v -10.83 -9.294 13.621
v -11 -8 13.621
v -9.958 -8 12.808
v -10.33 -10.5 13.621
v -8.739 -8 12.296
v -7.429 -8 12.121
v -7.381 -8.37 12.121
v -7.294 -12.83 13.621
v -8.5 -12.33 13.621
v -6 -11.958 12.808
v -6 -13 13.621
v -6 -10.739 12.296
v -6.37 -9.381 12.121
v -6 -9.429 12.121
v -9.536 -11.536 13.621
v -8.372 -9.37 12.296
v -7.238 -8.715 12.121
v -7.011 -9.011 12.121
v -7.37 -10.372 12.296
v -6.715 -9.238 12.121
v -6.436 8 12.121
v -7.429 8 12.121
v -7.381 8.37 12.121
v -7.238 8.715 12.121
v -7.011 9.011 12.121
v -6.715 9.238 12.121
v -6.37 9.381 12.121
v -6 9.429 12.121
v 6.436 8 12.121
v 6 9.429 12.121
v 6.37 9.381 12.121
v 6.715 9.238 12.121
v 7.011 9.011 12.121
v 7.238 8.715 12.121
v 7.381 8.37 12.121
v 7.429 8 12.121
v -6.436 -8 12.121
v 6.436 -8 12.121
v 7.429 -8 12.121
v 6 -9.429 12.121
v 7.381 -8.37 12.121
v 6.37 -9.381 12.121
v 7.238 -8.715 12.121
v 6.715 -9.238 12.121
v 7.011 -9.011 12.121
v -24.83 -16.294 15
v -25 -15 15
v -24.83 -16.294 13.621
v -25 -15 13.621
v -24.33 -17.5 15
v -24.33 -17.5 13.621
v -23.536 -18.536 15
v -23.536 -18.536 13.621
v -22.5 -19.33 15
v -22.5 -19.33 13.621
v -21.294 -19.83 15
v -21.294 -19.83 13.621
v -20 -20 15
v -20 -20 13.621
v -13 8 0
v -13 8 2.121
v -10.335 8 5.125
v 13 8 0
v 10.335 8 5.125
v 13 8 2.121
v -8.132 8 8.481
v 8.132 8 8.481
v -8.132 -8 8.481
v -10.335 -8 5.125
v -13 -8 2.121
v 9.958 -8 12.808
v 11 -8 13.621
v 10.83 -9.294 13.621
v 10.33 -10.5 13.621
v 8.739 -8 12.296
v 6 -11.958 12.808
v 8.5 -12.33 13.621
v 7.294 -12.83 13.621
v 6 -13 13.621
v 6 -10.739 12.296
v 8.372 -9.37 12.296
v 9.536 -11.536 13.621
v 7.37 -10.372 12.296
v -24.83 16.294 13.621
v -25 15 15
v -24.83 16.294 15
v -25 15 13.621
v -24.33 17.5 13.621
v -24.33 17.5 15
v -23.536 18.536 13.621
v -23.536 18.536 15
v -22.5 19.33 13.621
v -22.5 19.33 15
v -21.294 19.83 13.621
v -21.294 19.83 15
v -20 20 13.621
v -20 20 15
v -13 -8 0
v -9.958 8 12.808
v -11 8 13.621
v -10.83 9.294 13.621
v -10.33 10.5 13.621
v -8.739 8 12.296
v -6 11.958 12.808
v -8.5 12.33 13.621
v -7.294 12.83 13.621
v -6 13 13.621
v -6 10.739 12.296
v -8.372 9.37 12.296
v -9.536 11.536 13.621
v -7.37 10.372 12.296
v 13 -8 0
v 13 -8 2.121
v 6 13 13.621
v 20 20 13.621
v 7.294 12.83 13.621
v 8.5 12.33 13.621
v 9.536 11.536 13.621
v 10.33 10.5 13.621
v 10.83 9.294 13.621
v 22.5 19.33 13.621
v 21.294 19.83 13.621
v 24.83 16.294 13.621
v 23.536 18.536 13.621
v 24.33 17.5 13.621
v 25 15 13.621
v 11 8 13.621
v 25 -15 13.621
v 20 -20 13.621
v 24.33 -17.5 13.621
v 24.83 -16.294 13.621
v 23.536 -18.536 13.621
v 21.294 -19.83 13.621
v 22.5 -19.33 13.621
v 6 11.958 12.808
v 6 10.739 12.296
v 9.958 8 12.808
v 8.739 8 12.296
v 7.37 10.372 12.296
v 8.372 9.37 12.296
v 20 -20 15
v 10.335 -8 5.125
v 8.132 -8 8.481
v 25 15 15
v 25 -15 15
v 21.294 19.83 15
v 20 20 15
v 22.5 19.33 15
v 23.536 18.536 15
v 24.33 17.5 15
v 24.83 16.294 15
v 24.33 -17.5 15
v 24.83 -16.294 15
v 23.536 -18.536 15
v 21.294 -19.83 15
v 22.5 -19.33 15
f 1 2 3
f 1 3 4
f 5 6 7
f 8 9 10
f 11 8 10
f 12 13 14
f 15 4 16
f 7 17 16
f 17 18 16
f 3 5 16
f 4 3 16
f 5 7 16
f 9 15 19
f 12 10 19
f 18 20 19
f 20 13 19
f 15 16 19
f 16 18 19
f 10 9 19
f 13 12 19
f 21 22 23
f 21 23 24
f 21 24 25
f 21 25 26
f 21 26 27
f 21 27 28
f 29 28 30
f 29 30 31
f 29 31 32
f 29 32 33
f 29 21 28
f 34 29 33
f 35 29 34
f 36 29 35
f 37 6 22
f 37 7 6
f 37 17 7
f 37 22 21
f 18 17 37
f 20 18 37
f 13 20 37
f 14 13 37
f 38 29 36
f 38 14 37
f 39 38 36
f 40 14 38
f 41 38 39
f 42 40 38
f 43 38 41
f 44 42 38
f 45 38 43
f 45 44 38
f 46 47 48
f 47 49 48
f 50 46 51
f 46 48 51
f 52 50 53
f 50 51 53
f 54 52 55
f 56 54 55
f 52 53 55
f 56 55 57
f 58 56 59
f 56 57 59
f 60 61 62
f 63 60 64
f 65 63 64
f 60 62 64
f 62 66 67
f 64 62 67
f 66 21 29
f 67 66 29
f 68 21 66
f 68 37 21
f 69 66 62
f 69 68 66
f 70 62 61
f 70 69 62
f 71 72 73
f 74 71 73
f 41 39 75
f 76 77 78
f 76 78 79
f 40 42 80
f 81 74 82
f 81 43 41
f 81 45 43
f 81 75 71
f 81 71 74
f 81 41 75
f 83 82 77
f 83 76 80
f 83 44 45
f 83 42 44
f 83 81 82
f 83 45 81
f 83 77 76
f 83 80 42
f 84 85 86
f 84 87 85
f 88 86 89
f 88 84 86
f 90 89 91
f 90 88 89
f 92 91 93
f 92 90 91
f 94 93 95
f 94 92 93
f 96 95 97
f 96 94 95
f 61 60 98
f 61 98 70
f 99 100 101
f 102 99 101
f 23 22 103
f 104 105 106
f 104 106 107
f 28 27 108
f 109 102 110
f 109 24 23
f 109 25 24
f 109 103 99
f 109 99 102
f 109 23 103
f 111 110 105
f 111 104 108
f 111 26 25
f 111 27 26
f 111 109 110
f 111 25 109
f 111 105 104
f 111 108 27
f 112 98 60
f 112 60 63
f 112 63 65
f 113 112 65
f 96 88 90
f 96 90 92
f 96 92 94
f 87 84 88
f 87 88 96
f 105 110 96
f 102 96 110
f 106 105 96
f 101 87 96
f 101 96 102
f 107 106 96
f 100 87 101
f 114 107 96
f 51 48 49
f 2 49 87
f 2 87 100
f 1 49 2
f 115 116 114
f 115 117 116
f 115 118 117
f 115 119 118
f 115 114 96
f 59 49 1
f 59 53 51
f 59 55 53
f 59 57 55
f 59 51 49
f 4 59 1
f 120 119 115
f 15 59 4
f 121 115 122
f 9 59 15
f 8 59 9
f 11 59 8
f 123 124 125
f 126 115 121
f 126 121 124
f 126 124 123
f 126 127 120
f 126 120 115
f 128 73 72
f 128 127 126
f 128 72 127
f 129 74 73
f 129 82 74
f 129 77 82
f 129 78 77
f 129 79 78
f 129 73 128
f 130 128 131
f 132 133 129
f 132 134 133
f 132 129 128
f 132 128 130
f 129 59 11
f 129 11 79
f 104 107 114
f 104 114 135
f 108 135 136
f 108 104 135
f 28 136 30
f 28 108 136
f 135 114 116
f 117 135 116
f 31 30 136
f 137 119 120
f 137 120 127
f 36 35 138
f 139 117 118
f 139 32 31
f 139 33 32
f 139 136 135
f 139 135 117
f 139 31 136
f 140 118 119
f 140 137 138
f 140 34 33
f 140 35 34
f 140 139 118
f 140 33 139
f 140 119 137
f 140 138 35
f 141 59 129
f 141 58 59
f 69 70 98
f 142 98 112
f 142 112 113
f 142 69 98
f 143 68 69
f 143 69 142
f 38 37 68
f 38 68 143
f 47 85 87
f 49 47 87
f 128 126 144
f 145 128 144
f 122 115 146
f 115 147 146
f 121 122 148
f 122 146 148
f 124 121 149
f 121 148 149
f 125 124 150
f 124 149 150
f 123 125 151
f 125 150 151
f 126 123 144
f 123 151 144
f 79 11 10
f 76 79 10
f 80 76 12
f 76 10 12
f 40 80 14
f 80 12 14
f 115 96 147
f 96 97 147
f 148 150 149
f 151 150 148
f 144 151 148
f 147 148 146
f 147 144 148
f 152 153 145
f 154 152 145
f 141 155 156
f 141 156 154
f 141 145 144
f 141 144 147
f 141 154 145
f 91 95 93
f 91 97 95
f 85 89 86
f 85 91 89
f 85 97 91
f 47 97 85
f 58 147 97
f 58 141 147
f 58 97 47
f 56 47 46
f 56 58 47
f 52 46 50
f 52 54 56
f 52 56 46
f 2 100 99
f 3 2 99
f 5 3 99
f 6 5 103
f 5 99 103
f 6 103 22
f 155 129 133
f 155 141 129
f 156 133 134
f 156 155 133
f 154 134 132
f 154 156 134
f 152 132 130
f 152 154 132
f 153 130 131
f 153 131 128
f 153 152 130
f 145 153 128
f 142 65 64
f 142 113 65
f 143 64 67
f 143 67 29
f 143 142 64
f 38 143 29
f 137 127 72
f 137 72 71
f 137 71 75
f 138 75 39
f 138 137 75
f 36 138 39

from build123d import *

# Parameters (mm, degrees)
F1_DEPTH     = 20
F2_DEPTH     = 13
F0_W         = 13
F0_H         = 2.1210866805
F3_R         = 5
F4_R         = 5
F6_DEPTH     = 8
F7_R         = 5
F8_T1_DEPTH  = 12
F8_T3_DEPTH  = 16
F8_T6_ANGLE  = 90
F8_T8_ANGLE  = 90
F8_T10_ANGLE = 90
F8_T12_ANGLE = 90


# Not quite as in the source:
# - a fillet or chamfer that OpenCascade refuses, or shapes differently, is made with other operations: its cross-section is extruded or revolved along the edge and cut away or added


with BuildPart() as f1:
    # F0 (on Front) → F1 (new body, symmetric)
    with BuildSketch(Plane.XZ):
        Polygon((0, 13.6210866805), (0, 15), (-25, 15), (-25, 13.6210866805), (-11, 13.6210866805), align=None)
        Polygon((25, 15), (0, 15), (0, 13.6210866805), (11, 13.6210866805), (25, 13.6210866805), align=None)
    extrude(amount=F1_DEPTH, both=True)

    # F0 (on Front) → F2 (join, symmetric)
    with BuildSketch(Plane.XZ):
        Polygon((0, 12.1210866805), (0, 13.6210866805), (-11, 13.6210866805), (-11, 12.1210866805), (-6.4361323602, 12.1210866805), align=None)
        Polygon((11, 13.6210866805), (0, 13.6210866805), (0, 12.1210866805), (6.4361323602, 12.1210866805), (11, 12.1210866805), align=None)
    extrude(amount=F2_DEPTH, both=True)

    # F4
    f4_edges = [f1.edges().sort_by_distance(p)[0] for p in [
        (-25, -20, 14.310543),
        (-25, 20, 14.310543),
        (25, -20, 14.310543),
        (25, 20, 14.310543),
    ]]
    fillet(f4_edges, radius=F4_R)

    # F0 (on Front) → F6 (join, symmetric)
    with BuildSketch(Plane.XZ):
        with BuildLine():
            Line((0, 2.1210866805), (0, 12.1210866805))
            Line((0, 12.1210866805), (-6.4361323602, 12.1210866805))
            ThreePointArc((-6.4361323602, 12.1210866805), (-9.1727786789, 6.7631671822), (-13, 2.1210866805))
            Line((-13, 2.1210866805), (0, 2.1210866805))
        make_face()
        with Locations((-6.5, 1.0605433403)):
            Rectangle(F0_W, F0_H)
        with BuildLine():
            Line((6.4361323602, 12.1210866805), (0, 12.1210866805))
            Line((0, 12.1210866805), (0, 2.1210866805))
            Line((0, 2.1210866805), (13, 2.1210866805))
            ThreePointArc((13, 2.1210866805), (9.1727786789, 6.7631671822), (6.4361323602, 12.1210866805))
        make_face()
        with Locations((6.5, 1.0605433403)):
            Rectangle(F0_W, F0_H)
    extrude(amount=F6_DEPTH, both=True)

    # F7
    f7_edges = [f1.edges().sort_by_distance(p)[0] for p in [
        (-11, -13, 12.871087),
        (-11, 13, 12.871087),
        (11, -13, 12.871087),
        (11, 13, 12.871087),
    ]]
    fillet(f7_edges, radius=F7_R)

    # F8: fillet of radius 5 on 1 edges, made by hand

    # F8_s2 → F8_t1 (cut)
    with BuildSketch(Plane.YZ.offset(-6)):
        with BuildLine():
            ThreePointArc((-13, 13.6210866805), (-11.3657774588, 12.5113144519), (-9.4292857857, 12.1210866805))
            Line((-9.4292857857, 12.1210866805), (-9.4292857857, 12.0210866805))
            Line((-9.4292857857, 12.0210866805), (-13, 12.0210866805))
            Line((-13, 12.0210866805), (-13.1, 12.1210866805))
            ThreePointArc((-13.1, 12.1210866805), (-13.1, 12.8710866805), (-13.0714142843, 13.5510866805))
            Line((-13.0714142843, 13.5510866805), (-13, 13.6210866805))
        make_face()
        with BuildLine():
            ThreePointArc((13, 13.6210866805), (11.3657774588, 12.5113144519), (9.4292857857, 12.1210866805))
            Line((9.4292857857, 12.1210866805), (9.4292857857, 12.0210866805))
            Line((9.4292857857, 12.0210866805), (13, 12.0210866805))
            Line((13, 12.0210866805), (13.1, 12.1210866805))
            ThreePointArc((13.1, 12.1210866805), (13.1, 12.8710866805), (13.0714142843, 13.5510866805))
            Line((13.0714142843, 13.5510866805), (13, 13.6210866805))
        make_face()
    extrude(amount=F8_T1_DEPTH, mode=Mode.SUBTRACT)

    # F8_s4 → F8_t3 (cut)
    with BuildSketch(Plane.XZ.offset(-8)):
        with BuildLine():
            ThreePointArc((11, 13.6210866805), (9.3657774588, 12.5113144519), (7.4292857857, 12.1210866805))
            Line((7.4292857857, 12.1210866805), (7.4292857857, 12.0210866805))
            Line((7.4292857857, 12.0210866805), (11, 12.0210866805))
            Line((11, 12.0210866805), (11.1, 12.1210866805))
            ThreePointArc((11.1, 12.1210866805), (11.1, 12.8710866805), (11.0714142843, 13.5510866805))
            Line((11.0714142843, 13.5510866805), (11, 13.6210866805))
        make_face()
        with BuildLine():
            ThreePointArc((-11, 13.6210866805), (-9.3657774588, 12.5113144519), (-7.4292857857, 12.1210866805))
            Line((-7.4292857857, 12.1210866805), (-7.4292857857, 12.0210866805))
            Line((-7.4292857857, 12.0210866805), (-11, 12.0210866805))
            Line((-11, 12.0210866805), (-11.1, 12.1210866805))
            ThreePointArc((-11.1, 12.1210866805), (-11.1, 12.8710866805), (-11.0714142843, 13.5510866805))
            Line((-11.0714142843, 13.5510866805), (-11, 13.6210866805))
        make_face()
    extrude(amount=F8_T3_DEPTH, mode=Mode.SUBTRACT)

    # F8_s5 → F8_t6 (revolve, cut)
    with BuildSketch(Plane.XZ.offset(8)):
        with BuildLine():
            ThreePointArc((-11, 13.6210866805), (-9.3657774588, 12.5113144519), (-7.4292857857, 12.1210866805))
            Line((-7.4292857857, 12.1210866805), (-7.4292857857, 12.0210866805))
            Line((-7.4292857857, 12.0210866805), (-11, 12.0210866805))
            Line((-11, 12.0210866805), (-11.1, 12.1210866805))
            ThreePointArc((-11.1, 12.1210866805), (-11.1, 12.8710866805), (-11.0714142843, 13.5510866805))
            Line((-11.0714142843, 13.5510866805), (-11, 13.6210866805))
        make_face()
    revolve(axis=Axis((-6, -8, 12.1210866805), (0, 0, 1)), revolution_arc=F8_T6_ANGLE, mode=Mode.SUBTRACT)

    # F8_s7 → F8_t8 (revolve, cut)
    with BuildSketch(Plane.XZ.offset(8)):
        with BuildLine():
            ThreePointArc((11, 13.6210866805), (9.3657774588, 12.5113144519), (7.4292857857, 12.1210866805))
            Line((7.4292857857, 12.1210866805), (7.4292857857, 12.0210866805))
            Line((7.4292857857, 12.0210866805), (11, 12.0210866805))
            Line((11, 12.0210866805), (11.1, 12.1210866805))
            ThreePointArc((11.1, 12.1210866805), (11.1, 12.8710866805), (11.0714142843, 13.5510866805))
            Line((11.0714142843, 13.5510866805), (11, 13.6210866805))
        make_face()
    revolve(axis=Axis((6, -8, 12.1210866805), (0, 0, -1)), revolution_arc=F8_T8_ANGLE, mode=Mode.SUBTRACT)

    # F8_s9 → F8_t10 (revolve, cut)
    with BuildSketch(Plane.YZ.offset(6)):
        with BuildLine():
            ThreePointArc((13, 13.6210866805), (11.3657774588, 12.5113144519), (9.4292857857, 12.1210866805))
            Line((9.4292857857, 12.1210866805), (9.4292857857, 12.0210866805))
            Line((9.4292857857, 12.0210866805), (13, 12.0210866805))
            Line((13, 12.0210866805), (13.1, 12.1210866805))
            ThreePointArc((13.1, 12.1210866805), (13.1, 12.8710866805), (13.0714142843, 13.5510866805))
            Line((13.0714142843, 13.5510866805), (13, 13.6210866805))
        make_face()
    revolve(axis=Axis((6, 8, 12.1210866805), (0, 0, -1)), revolution_arc=F8_T10_ANGLE, mode=Mode.SUBTRACT)

    # F8_s11 → F8_t12 (revolve, cut)
    with BuildSketch(Plane.XZ.offset(-8)):
        with BuildLine():
            ThreePointArc((-11, 13.6210866805), (-9.3657774588, 12.5113144519), (-7.4292857857, 12.1210866805))
            Line((-7.4292857857, 12.1210866805), (-7.4292857857, 12.0210866805))
            Line((-7.4292857857, 12.0210866805), (-11, 12.0210866805))
            Line((-11, 12.0210866805), (-11.1, 12.1210866805))
            ThreePointArc((-11.1, 12.1210866805), (-11.1, 12.8710866805), (-11.0714142843, 13.5510866805))
            Line((-11.0714142843, 13.5510866805), (-11, 13.6210866805))
        make_face()
    revolve(axis=Axis((-6, 8, 12.1210866805), (0, 0, -1)), revolution_arc=F8_T12_ANGLE, mode=Mode.SUBTRACT)


with BuildPart() as f2:
    # F0 (on Front) → F2, piece 2 (new body, symmetric)
    with BuildSketch(Plane.XZ):
        with Locations((-6.5, 1.0605433403)):
            Rectangle(F0_W, F0_H)
        with Locations((6.5, 1.0605433403)):
            Rectangle(F0_W, F0_H)
    extrude(amount=F2_DEPTH, both=True)

    # F3
    f3_edges = [f2.edges().sort_by_distance(p)[0] for p in [
        (-13, 13, 1.060543),
        (-13, -13, 1.060543),
        (13, -13, 1.060543),
        (13, 13, 1.060543),
    ]]
    fillet(f3_edges, radius=F3_R)


solid = f1.part
